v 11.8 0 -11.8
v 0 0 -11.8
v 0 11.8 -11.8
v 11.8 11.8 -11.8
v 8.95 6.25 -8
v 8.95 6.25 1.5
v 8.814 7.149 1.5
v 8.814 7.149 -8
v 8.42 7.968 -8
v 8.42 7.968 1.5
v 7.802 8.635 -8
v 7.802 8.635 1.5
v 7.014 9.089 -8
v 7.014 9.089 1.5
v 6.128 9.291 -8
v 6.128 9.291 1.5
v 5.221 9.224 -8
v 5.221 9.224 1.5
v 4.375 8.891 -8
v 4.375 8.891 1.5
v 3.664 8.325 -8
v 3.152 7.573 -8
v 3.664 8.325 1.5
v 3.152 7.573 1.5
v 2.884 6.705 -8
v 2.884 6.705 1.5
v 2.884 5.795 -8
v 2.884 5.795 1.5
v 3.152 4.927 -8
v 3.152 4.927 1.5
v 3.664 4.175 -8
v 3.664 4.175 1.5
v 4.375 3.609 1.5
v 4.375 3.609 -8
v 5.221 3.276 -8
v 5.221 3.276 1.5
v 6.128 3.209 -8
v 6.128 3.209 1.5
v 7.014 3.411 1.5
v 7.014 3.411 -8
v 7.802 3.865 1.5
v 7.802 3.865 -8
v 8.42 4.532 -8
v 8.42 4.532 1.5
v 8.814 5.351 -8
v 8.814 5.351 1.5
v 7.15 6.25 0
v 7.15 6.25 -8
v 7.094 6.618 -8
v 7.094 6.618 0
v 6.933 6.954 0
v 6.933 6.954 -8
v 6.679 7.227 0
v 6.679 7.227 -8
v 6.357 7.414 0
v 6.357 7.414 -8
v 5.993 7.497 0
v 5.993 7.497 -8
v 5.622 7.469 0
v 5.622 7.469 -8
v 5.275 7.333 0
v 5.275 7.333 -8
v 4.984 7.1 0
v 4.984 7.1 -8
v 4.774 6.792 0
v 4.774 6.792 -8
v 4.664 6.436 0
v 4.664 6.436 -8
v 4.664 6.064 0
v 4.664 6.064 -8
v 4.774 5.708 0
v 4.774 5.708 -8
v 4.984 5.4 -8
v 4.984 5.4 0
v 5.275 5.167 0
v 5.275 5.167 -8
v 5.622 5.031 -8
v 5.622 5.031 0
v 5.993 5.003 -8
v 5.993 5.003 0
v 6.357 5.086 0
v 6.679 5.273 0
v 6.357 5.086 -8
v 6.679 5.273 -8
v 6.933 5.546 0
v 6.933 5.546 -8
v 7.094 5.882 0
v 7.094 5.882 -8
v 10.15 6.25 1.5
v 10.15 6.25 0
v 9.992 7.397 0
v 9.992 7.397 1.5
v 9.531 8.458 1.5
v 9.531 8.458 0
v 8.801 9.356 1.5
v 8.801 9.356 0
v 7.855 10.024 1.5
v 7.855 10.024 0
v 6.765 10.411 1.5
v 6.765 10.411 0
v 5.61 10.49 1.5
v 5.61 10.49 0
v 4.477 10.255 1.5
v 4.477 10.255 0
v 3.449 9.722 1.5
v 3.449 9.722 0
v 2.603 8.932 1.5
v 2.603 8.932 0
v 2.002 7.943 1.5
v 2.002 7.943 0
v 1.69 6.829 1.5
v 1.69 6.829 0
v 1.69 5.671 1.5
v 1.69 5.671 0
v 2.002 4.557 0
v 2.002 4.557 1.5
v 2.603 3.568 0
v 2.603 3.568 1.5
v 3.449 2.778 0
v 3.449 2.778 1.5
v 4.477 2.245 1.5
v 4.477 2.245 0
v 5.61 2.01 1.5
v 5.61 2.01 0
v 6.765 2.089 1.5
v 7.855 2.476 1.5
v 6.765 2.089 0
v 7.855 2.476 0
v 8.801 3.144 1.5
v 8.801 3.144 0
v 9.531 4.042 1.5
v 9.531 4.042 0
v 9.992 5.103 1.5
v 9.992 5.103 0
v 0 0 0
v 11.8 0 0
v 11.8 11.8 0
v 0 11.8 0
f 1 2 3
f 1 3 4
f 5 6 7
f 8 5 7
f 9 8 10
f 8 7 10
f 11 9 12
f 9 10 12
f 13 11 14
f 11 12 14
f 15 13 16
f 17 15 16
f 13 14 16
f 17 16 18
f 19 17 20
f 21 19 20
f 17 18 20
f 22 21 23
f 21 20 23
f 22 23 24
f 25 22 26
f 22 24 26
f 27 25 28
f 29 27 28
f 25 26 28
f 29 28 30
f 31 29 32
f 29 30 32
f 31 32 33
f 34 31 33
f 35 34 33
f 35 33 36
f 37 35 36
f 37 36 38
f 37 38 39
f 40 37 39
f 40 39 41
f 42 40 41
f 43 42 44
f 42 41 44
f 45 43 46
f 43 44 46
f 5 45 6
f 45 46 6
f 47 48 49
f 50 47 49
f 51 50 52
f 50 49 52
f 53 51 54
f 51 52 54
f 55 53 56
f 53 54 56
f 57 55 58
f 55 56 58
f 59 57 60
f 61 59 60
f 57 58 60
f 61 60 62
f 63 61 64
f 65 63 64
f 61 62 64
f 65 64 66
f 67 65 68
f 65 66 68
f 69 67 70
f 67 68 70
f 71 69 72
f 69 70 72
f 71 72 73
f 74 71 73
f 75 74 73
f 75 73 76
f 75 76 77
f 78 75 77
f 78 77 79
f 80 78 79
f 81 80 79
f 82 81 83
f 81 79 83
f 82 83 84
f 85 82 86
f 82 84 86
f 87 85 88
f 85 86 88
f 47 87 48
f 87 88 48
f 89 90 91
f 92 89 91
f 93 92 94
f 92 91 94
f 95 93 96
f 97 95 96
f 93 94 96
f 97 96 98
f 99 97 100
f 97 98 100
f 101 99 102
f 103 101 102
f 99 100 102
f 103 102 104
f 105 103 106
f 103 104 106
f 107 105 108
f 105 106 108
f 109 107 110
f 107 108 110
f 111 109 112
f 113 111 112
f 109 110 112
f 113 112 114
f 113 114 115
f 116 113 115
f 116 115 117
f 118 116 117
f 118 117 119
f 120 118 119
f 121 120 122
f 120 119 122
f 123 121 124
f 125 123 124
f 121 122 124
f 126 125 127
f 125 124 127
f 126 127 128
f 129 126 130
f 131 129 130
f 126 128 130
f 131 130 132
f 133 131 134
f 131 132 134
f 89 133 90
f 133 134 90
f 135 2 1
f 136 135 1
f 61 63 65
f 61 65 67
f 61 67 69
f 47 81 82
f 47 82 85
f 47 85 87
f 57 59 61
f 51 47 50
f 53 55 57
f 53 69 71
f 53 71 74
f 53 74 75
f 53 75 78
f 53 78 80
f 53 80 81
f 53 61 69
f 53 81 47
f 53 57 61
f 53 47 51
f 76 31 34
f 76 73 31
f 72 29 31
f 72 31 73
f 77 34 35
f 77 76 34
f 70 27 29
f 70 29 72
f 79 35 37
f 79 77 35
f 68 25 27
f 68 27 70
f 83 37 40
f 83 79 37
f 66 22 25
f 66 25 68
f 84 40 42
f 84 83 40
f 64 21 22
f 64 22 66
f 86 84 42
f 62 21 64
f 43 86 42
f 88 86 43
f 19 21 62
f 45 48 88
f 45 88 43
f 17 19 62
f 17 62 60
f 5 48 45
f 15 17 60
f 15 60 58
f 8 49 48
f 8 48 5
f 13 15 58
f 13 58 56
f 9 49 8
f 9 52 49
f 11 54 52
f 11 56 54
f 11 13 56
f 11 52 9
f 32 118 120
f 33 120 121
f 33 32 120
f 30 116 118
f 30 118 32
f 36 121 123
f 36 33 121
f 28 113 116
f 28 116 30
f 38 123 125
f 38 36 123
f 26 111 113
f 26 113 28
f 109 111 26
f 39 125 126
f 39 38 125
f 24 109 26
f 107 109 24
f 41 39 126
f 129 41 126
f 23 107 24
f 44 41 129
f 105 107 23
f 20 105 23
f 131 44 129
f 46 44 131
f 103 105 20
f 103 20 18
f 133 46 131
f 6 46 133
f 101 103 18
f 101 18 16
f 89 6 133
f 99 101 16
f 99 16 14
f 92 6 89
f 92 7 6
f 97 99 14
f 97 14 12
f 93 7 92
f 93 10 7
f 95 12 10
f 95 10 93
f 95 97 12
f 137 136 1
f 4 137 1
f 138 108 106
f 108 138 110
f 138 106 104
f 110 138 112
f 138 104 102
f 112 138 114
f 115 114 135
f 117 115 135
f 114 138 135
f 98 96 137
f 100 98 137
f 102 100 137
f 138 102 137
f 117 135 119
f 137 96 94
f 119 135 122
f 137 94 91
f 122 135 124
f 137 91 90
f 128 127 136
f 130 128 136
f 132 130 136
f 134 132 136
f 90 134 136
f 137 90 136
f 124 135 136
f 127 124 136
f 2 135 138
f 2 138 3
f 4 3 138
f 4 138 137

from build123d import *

# Parameters (mm, degrees)
SKETCH1_W           = 11.8
SKETCH1_H           = 11.8
BOSS_EXTRUDE1_DEPTH = 11.8
SKETCH2_R           = 4.25
BOSS_EXTRUDE2_DEPTH = 1.5
SKETCH3_R           = 3.05
CUT_EXTRUDE1_DEPTH  = 9.5
SKETCH4_R           = 1.25
BOSS_EXTRUDE3_DEPTH = 8


with BuildPart() as part:
    # Sketch1 → Boss-Extrude1 (new body)
    with BuildSketch(Plane(origin=(0, 0, 0), x_dir=(1, 0, 0), z_dir=(0, 1, 0))):
        with Locations((5.9, 5.9)):
            Rectangle(SKETCH1_W, SKETCH1_H)
    extrude(amount=BOSS_EXTRUDE1_DEPTH)

    # Sketch2 → Boss-Extrude2 (add)
    with BuildSketch(Plane.XY):
        with Locations((5.9, 6.25)):
            Circle(SKETCH2_R)
    extrude(amount=BOSS_EXTRUDE2_DEPTH)

    # Sketch3 → Cut-Extrude1 (cut)
    with BuildSketch(Plane.XY.offset(1.5)):
        with Locations((5.9, 6.25)):
            Circle(SKETCH3_R)
    extrude(amount=-CUT_EXTRUDE1_DEPTH, mode=Mode.SUBTRACT)

    # Sketch4 → Boss-Extrude3 (add)
    with BuildSketch(Plane.XY.offset(-8)):
        with Locations((5.9, 6.25)):
            Circle(SKETCH4_R)
    extrude(amount=BOSS_EXTRUDE3_DEPTH)


solid = part.part
